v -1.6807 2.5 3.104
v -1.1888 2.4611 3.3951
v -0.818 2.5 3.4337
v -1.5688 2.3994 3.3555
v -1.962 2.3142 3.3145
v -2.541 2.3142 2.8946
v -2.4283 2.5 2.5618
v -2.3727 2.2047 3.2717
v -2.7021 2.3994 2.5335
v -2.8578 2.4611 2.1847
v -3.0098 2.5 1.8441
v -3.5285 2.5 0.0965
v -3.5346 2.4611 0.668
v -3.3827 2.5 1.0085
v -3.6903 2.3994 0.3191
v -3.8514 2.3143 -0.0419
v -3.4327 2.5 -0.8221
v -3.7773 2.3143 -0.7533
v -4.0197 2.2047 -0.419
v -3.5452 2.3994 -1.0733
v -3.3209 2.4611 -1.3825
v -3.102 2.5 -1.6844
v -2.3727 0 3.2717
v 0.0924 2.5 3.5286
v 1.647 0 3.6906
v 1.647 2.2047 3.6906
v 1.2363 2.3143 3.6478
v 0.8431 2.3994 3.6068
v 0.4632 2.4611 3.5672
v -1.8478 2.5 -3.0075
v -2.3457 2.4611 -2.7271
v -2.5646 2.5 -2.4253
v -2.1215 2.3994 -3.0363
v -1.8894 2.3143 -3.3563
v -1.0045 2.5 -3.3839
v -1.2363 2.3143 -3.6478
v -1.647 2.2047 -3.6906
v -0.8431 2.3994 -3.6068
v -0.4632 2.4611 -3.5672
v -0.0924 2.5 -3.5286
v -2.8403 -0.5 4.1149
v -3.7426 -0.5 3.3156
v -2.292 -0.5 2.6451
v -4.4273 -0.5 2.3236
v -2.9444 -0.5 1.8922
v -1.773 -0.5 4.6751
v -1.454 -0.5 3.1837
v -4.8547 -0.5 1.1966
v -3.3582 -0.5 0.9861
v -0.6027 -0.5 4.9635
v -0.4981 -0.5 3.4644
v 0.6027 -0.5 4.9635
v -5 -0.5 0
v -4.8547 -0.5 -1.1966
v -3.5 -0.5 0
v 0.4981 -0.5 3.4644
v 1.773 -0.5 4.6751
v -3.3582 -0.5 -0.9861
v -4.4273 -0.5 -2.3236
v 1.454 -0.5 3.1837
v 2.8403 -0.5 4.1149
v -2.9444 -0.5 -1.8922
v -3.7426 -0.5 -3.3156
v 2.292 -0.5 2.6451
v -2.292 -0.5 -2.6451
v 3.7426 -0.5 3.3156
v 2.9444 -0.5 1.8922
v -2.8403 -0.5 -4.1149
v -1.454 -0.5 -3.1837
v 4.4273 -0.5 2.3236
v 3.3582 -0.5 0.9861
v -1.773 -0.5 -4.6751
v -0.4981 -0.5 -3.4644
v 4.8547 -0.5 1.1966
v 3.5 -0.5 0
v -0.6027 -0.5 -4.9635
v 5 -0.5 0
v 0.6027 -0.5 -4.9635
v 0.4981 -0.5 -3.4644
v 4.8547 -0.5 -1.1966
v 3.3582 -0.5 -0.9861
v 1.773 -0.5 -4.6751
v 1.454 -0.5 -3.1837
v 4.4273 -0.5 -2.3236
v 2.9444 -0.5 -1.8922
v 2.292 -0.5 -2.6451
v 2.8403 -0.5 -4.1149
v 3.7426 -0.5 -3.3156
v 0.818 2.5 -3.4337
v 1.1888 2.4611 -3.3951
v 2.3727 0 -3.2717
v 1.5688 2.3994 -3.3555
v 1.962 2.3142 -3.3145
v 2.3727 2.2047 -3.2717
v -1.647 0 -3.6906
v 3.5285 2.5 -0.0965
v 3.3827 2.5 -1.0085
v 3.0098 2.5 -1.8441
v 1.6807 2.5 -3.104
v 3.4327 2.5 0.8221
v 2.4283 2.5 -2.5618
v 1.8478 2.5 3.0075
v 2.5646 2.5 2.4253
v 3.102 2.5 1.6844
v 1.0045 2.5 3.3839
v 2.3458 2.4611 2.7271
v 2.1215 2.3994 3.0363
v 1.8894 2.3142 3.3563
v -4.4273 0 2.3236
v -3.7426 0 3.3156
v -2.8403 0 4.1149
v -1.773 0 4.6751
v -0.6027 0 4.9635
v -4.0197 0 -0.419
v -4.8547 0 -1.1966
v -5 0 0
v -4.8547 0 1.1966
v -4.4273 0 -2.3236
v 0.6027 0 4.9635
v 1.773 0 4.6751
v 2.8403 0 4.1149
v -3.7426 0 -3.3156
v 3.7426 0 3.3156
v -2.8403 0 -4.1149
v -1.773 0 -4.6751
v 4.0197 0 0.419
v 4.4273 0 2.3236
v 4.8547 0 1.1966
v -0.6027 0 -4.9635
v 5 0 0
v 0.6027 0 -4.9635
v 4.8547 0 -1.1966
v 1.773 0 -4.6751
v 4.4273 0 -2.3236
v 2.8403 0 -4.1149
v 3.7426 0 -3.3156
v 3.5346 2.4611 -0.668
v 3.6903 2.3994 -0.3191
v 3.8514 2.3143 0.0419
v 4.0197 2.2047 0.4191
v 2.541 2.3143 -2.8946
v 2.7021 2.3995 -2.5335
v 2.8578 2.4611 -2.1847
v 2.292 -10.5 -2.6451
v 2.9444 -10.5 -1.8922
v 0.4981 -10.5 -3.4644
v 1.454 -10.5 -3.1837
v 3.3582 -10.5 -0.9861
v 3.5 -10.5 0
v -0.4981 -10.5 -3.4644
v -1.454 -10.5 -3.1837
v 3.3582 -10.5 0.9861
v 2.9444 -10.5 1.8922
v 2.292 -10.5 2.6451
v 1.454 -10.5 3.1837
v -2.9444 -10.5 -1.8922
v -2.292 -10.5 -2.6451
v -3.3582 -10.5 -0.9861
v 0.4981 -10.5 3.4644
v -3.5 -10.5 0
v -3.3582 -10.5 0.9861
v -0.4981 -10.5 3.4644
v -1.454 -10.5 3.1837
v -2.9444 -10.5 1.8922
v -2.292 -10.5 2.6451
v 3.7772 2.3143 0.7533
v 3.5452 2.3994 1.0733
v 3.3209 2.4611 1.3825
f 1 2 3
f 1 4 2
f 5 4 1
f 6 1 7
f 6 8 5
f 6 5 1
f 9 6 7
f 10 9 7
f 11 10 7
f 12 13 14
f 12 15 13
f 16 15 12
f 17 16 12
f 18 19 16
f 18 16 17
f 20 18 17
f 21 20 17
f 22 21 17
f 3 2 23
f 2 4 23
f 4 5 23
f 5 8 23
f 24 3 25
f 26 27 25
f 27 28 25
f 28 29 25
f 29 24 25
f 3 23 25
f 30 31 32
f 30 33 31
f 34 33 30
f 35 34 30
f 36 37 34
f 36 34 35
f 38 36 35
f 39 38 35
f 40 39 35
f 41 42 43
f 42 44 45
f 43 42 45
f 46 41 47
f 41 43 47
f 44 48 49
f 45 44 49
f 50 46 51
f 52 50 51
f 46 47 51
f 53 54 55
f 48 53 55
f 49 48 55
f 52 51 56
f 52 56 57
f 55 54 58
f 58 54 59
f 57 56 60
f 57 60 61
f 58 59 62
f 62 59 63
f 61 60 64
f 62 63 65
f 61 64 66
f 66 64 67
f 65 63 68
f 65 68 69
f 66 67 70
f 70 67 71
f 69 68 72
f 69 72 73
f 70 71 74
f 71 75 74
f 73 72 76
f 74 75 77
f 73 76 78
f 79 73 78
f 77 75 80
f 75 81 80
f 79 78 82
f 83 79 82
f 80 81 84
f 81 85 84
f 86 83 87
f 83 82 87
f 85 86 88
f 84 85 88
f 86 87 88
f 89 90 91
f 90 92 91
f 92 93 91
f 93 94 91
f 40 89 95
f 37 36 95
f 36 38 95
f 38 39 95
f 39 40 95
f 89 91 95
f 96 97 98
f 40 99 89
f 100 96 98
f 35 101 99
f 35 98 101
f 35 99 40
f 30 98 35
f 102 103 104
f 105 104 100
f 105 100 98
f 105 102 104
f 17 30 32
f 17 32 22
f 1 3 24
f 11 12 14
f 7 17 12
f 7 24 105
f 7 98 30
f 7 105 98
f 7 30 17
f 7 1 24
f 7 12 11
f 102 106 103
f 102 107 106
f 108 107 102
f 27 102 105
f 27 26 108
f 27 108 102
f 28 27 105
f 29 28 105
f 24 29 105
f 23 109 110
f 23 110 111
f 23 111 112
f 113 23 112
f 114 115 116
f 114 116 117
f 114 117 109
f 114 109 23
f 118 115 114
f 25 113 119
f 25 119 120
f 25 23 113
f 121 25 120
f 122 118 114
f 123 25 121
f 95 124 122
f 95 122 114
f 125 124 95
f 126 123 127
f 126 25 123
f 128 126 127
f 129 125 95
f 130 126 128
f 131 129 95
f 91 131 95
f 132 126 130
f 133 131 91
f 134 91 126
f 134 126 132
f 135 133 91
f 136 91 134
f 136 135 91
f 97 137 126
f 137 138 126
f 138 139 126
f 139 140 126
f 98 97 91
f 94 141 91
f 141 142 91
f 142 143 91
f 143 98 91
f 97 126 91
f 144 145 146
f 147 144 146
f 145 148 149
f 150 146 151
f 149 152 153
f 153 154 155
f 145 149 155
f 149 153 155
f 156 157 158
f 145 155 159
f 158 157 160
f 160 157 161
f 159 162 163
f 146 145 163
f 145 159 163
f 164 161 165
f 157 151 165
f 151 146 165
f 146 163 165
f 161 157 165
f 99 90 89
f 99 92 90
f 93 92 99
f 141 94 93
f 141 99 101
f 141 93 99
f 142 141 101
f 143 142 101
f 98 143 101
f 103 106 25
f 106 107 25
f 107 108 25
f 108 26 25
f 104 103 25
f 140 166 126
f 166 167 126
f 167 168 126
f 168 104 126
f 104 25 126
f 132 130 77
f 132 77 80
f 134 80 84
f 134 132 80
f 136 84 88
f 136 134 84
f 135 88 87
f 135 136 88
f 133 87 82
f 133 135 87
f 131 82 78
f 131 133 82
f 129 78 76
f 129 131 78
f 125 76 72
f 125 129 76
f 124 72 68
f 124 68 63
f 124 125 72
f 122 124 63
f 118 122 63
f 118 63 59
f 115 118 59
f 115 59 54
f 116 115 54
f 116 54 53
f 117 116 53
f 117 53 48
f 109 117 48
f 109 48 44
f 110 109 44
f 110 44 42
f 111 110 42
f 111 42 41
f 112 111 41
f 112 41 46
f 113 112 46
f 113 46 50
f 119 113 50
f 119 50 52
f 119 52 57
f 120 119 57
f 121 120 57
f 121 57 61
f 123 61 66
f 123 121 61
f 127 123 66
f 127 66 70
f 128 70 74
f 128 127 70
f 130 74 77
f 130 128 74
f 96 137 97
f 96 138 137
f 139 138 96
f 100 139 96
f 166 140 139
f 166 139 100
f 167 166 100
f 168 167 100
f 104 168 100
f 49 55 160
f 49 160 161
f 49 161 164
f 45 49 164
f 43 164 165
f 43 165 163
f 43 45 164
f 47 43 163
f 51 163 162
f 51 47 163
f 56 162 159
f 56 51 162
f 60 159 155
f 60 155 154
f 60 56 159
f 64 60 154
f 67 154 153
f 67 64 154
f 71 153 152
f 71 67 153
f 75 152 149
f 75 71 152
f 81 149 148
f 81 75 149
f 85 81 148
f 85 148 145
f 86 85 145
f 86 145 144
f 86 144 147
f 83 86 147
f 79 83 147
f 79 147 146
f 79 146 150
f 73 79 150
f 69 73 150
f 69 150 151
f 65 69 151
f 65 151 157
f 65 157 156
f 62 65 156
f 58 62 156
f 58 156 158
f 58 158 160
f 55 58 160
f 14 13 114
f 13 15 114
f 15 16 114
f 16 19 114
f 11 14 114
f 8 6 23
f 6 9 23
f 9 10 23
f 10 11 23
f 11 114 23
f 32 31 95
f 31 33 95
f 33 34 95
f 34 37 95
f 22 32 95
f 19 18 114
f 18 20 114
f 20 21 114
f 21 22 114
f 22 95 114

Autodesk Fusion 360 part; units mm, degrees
sketch "Sketch1" plane through (0, 0, 0) normal (0, 1, 0) x (1, 0, 0)
  line L0 (4.0197, -0.419) -> (2.3727, 3.2717)
  line L1 (2.3727, 3.2717) -> (-1.647, 3.6906)
  line L2 (-1.647, 3.6906) -> (-4.0197, 0.419)
  line L3 (-4.0197, 0.419) -> (-2.3727, -3.2717)
  line L4 (-2.3727, -3.2717) -> (1.647, -3.6906)
  line L5 (1.647, -3.6906) -> (4.0197, -0.419)
  circle A0 centre (0, 0) radius 3.5
  dimension "d2" = 7
extrude "Extrude1" add sketch "Sketch1" along normal blind 2.5
sketch "Sketch2" plane through (0, 0, 0) normal (0, 1, 0) x (1, 0, 0)
  circle A0 centre (0, 0) radius 5
  dimension "d5" = 10
extrude "Extrude2" add sketch "Sketch2" against normal blind 0.5
sketch "Sketch3" plane through (0, 2.5, 0) normal (0, 1, 0) x (-1, 0, 0)
  line L0 (-1.647, 3.6906) -> (-4.0197, 0.419)
  line L1 (-4.0197, 0.419) -> (-2.3727, -3.2717)
  line L2 (-2.3727, -3.2717) -> (1.647, -3.6906)
  line L3 (1.647, -3.6906) -> (4.0197, -0.419)
  line L4 (4.0197, -0.419) -> (2.3727, 3.2717)
  line L5 (2.3727, 3.2717) -> (-1.647, 3.6906)
  circle A0 centre (0, 0) radius 3.5
  dimension "d8" = 7
extrude "Extrude3" add sketch "Sketch3" against normal blind 13 contours A0
sketch "Sketch4" plane through (0, 2.5, 0) normal (0, 1, 0) x (-1, 0, 0)
ref_plane "WorkPlane1" through (0, 1.25, 0) normal (-0.1037, 0, 0.9946) x (0.9946, 0, 0.1037)
sketch "Sketch5" plane through (0, 1.25, 0) normal (-0.1037, 0, 0.9946) x (0.9946, 0, 0.1037)
  line L0 (0, 0) -> (0, 1.25)
sketch "Sketch6" plane through (0, 1.25, 0) normal (-0.1037, 0, 0.9946) x (0.9946, 0, 0.1037)
sketch "Sketch7" plane through (0, 1.25, 0) normal (-0.1037, 0, 0.9946) x (0.9946, 0, 0.1037)
  line L0 (4.0463, 1.2672) -> (3.5, 1.2672)
  line L1 (4.0463, 1.2672) -> (4.0463, 0.9519)
  line L2 (3.5, 1.2672) -> (4.0463, 0.9519)
  line L3 (0, 6.5) -> (0, -6)
revolve "Revolve1" cut sketch "Sketch7" angle 360 about axis through (0, 7.75, 0) along (0, -1, 0)
